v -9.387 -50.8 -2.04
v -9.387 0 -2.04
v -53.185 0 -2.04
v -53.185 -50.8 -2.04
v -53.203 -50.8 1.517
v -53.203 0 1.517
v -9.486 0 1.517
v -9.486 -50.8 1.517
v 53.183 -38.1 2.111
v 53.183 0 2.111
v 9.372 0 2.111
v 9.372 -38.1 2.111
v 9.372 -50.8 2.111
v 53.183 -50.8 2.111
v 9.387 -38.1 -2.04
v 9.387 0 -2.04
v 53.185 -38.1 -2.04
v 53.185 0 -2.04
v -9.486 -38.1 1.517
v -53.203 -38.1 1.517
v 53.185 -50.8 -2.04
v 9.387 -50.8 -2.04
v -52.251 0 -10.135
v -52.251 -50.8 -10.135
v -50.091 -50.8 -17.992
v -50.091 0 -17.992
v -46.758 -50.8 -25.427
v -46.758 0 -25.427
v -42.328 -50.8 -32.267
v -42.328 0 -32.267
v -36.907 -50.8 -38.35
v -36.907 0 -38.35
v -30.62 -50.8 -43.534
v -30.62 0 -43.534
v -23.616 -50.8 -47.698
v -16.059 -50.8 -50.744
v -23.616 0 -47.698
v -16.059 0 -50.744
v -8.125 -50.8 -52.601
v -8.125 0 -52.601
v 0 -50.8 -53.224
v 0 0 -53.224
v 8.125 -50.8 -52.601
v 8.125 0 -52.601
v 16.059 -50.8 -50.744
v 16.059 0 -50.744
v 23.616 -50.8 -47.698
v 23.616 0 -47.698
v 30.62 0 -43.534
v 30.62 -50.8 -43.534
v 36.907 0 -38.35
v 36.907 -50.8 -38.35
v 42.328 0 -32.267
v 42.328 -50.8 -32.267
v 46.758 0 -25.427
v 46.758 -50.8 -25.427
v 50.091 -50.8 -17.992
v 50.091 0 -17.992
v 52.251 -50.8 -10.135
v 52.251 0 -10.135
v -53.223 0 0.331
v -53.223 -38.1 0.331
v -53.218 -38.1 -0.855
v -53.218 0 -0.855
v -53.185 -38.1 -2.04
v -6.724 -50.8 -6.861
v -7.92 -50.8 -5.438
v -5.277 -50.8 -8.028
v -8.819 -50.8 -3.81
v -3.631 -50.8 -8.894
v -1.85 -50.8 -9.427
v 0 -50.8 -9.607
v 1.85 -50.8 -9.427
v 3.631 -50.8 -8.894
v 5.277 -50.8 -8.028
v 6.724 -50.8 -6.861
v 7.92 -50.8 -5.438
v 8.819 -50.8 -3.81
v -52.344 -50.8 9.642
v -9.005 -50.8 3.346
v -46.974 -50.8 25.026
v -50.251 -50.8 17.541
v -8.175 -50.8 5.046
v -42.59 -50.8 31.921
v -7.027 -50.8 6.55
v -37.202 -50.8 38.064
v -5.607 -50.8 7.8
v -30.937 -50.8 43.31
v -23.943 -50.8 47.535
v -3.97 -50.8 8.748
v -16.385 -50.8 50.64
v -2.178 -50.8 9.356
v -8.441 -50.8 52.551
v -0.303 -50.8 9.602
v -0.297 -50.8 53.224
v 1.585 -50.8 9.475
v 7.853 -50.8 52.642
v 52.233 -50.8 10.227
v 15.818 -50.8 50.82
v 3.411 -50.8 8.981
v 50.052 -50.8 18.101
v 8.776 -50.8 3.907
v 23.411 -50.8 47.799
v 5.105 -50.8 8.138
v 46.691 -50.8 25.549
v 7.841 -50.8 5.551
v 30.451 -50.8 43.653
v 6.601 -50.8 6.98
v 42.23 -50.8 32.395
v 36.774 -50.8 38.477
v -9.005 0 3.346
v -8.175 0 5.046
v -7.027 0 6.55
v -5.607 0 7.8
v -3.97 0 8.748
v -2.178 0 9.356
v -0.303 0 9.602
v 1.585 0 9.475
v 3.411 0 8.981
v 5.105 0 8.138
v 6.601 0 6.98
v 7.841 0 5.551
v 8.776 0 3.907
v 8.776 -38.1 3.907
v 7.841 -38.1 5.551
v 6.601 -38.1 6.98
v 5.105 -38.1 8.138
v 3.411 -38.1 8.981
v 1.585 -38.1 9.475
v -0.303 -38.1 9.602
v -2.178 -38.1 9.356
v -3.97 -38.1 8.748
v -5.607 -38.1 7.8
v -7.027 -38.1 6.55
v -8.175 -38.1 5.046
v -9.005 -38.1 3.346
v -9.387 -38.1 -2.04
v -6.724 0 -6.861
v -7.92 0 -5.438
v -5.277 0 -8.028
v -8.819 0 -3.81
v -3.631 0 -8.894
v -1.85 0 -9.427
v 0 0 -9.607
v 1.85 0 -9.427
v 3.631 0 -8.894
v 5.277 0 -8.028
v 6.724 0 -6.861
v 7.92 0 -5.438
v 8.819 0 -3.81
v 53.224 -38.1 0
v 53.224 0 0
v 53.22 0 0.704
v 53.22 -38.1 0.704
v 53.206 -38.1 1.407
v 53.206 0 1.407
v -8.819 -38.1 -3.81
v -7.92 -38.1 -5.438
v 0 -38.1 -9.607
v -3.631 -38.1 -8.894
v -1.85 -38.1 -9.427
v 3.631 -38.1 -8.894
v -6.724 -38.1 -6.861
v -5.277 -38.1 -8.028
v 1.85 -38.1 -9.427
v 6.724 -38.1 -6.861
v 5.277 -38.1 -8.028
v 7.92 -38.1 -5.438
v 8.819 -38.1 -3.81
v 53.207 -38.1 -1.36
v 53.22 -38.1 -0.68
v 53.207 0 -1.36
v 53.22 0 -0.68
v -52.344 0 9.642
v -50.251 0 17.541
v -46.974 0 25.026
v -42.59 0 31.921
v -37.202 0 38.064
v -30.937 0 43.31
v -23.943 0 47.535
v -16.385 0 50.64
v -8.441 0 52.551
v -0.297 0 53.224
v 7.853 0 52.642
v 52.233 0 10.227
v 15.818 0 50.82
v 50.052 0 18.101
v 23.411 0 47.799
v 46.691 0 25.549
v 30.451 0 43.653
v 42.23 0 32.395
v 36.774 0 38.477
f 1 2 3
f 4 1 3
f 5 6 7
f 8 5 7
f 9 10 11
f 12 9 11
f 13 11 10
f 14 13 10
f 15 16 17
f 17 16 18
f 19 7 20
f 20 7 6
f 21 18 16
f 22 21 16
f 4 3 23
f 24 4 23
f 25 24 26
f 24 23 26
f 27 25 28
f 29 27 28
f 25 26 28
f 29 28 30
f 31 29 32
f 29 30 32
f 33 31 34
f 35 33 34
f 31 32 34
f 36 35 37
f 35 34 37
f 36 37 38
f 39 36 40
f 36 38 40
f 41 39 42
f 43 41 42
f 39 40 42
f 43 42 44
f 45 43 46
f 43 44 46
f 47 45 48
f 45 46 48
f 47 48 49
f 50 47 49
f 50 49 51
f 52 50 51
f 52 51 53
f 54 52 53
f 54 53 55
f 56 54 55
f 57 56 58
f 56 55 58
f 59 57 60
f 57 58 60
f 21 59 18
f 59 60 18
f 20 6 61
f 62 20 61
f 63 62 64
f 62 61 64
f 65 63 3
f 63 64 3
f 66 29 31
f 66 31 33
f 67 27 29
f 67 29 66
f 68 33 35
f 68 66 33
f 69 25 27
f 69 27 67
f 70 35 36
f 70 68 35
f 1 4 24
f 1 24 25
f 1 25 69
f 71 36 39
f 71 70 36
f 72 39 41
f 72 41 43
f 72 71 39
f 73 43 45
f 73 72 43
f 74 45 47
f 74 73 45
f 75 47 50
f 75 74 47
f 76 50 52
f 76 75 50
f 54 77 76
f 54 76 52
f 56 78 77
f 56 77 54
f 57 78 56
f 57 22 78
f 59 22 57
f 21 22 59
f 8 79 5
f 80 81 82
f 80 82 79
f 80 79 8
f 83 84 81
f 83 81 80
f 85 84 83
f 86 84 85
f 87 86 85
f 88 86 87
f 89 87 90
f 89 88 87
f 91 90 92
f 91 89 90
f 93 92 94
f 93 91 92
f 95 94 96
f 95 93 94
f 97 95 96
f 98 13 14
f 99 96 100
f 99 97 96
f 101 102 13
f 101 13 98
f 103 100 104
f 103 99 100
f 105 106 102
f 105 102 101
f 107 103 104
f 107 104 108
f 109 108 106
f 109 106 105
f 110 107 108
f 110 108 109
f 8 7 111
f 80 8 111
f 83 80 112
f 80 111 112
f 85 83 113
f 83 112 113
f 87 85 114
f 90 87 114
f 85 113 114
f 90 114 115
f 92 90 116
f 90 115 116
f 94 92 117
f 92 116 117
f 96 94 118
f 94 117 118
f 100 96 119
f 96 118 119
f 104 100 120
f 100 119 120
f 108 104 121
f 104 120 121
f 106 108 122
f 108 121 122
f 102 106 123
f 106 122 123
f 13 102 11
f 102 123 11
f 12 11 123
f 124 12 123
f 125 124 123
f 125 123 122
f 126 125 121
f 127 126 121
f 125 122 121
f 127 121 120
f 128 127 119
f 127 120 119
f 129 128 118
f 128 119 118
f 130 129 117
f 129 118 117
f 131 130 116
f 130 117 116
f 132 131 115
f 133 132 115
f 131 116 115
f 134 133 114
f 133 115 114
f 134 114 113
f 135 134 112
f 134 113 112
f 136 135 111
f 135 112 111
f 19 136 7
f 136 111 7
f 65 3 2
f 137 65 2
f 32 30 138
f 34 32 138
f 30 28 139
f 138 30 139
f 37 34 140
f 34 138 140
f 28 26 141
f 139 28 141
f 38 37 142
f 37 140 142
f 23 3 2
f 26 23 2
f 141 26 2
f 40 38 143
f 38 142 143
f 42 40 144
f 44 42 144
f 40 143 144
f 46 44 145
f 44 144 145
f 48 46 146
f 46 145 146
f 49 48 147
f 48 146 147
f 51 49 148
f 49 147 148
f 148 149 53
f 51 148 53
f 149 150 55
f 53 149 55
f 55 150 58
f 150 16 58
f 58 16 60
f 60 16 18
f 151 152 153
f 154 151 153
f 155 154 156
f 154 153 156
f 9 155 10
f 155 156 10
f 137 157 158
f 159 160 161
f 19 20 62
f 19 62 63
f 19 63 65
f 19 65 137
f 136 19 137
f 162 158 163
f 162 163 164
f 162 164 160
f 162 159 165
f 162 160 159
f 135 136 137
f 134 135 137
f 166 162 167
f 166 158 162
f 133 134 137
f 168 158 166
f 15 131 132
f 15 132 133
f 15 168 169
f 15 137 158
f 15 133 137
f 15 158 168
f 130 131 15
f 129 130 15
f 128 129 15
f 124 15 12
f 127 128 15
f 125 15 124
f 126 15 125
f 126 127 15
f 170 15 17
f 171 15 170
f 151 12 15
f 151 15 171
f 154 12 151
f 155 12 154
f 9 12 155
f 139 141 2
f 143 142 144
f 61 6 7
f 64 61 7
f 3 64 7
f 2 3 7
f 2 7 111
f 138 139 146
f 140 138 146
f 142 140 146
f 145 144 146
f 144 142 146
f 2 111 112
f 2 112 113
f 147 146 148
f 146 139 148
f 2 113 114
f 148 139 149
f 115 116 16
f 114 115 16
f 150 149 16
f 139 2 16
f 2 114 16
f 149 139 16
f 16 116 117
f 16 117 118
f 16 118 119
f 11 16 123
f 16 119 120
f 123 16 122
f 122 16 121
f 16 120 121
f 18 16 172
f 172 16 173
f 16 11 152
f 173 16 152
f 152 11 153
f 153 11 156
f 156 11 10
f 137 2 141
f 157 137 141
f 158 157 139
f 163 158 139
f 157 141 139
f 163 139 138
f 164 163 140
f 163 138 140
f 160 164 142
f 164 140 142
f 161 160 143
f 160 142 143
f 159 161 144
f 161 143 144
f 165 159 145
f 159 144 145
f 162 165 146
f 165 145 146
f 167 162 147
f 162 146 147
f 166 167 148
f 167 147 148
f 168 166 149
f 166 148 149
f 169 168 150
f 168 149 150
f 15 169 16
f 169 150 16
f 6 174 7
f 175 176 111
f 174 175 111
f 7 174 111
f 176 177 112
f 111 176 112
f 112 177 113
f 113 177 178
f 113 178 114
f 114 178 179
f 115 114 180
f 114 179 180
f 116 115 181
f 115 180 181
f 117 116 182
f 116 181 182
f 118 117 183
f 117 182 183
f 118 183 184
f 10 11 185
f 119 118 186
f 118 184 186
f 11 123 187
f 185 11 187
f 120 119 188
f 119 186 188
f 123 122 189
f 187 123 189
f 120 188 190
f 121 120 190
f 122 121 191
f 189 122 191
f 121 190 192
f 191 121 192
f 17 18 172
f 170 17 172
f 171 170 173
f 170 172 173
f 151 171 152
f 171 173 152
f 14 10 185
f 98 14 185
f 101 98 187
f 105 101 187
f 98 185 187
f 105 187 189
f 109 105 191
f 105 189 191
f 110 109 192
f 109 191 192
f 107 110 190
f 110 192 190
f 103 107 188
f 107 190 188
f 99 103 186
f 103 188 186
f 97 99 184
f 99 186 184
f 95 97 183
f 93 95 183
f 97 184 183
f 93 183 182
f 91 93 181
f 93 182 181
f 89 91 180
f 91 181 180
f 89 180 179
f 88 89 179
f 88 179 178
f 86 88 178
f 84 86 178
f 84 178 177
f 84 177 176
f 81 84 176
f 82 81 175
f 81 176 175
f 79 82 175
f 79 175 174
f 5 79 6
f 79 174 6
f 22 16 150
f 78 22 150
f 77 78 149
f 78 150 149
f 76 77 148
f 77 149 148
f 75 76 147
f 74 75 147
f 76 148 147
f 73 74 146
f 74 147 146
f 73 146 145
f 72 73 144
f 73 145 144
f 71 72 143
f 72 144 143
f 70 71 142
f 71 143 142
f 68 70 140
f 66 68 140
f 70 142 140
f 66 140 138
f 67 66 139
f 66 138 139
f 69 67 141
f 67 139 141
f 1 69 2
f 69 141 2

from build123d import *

# Parameters (mm, degrees)
F1_DEPTH = 50.8
F2_DEPTH = 38.1


with BuildPart() as f1:
    # F0 (on Front) → F1 (new body)
    with BuildSketch(Plane.XZ):
        with BuildLine():
            Line((9.371838, 2.110901), (53.182594, 2.110901))
            ThreePointArc((53.182594, 2.110901), (-0.297322, 53.22364), (-53.202858, 1.516602))
            Line((-53.202858, 1.516602), (-9.486156, 1.516602))
            ThreePointArc((-9.486156, 1.516602), (-0.302597, 9.601858), (9.371838, 2.110901))
        make_face()
        with BuildLine():
            ThreePointArc((-53.185347, -2.040356), (0, -53.22447), (53.185347, -2.040356))
            Line((53.185347, -2.040356), (9.387448, -2.040356))
            ThreePointArc((9.387448, -2.040356), (0, -9.606625), (-9.387448, -2.040356))
            Line((-9.387448, -2.040356), (-53.185347, -2.040356))
        make_face()
    extrude(amount=F1_DEPTH)


with BuildPart() as f2:
    # F0 (on Front) → F2 (new body)
    with BuildSketch(Plane.XZ):
        with BuildLine():
            ThreePointArc((53.185347, -2.040356), (53.214689, -1.020366), (53.22447, 0))
            ThreePointArc((53.22447, 0), (53.214, 1.055658), (53.182594, 2.110901))
            Line((53.182594, 2.110901), (9.371838, 2.110901))
            ThreePointArc((9.371838, 2.110901), (9.547748, 1.061959), (9.606625, 0))
            ThreePointArc((9.606625, 0), (9.551674, -1.026047), (9.387448, -2.040356))
            Line((9.387448, -2.040356), (53.185347, -2.040356))
        make_face()
        with BuildLine():
            ThreePointArc((9.606625, 0), (9.547748, 1.061959), (9.371838, 2.110901))
            ThreePointArc((9.371838, 2.110901), (-0.302597, 9.601858), (-9.486156, 1.516602))
            ThreePointArc((-9.486156, 1.516602), (-9.602928, -0.266487), (-9.387448, -2.040356))
            ThreePointArc((-9.387448, -2.040356), (0, -9.606625), (9.387448, -2.040356))
            ThreePointArc((9.387448, -2.040356), (9.551674, -1.026047), (9.606625, 0))
        make_face()
        with BuildLine():
            Line((-9.486156, 1.516602), (-53.202858, 1.516602))
            ThreePointArc((-53.202858, 1.516602), (-53.223825, -0.262024), (-53.185347, -2.040356))
            Line((-53.185347, -2.040356), (-9.387448, -2.040356))
            ThreePointArc((-9.387448, -2.040356), (-9.602928, -0.266487), (-9.486156, 1.516602))
        make_face()
    extrude(amount=F2_DEPTH)


solid = Compound([f1.part, f2.part])
